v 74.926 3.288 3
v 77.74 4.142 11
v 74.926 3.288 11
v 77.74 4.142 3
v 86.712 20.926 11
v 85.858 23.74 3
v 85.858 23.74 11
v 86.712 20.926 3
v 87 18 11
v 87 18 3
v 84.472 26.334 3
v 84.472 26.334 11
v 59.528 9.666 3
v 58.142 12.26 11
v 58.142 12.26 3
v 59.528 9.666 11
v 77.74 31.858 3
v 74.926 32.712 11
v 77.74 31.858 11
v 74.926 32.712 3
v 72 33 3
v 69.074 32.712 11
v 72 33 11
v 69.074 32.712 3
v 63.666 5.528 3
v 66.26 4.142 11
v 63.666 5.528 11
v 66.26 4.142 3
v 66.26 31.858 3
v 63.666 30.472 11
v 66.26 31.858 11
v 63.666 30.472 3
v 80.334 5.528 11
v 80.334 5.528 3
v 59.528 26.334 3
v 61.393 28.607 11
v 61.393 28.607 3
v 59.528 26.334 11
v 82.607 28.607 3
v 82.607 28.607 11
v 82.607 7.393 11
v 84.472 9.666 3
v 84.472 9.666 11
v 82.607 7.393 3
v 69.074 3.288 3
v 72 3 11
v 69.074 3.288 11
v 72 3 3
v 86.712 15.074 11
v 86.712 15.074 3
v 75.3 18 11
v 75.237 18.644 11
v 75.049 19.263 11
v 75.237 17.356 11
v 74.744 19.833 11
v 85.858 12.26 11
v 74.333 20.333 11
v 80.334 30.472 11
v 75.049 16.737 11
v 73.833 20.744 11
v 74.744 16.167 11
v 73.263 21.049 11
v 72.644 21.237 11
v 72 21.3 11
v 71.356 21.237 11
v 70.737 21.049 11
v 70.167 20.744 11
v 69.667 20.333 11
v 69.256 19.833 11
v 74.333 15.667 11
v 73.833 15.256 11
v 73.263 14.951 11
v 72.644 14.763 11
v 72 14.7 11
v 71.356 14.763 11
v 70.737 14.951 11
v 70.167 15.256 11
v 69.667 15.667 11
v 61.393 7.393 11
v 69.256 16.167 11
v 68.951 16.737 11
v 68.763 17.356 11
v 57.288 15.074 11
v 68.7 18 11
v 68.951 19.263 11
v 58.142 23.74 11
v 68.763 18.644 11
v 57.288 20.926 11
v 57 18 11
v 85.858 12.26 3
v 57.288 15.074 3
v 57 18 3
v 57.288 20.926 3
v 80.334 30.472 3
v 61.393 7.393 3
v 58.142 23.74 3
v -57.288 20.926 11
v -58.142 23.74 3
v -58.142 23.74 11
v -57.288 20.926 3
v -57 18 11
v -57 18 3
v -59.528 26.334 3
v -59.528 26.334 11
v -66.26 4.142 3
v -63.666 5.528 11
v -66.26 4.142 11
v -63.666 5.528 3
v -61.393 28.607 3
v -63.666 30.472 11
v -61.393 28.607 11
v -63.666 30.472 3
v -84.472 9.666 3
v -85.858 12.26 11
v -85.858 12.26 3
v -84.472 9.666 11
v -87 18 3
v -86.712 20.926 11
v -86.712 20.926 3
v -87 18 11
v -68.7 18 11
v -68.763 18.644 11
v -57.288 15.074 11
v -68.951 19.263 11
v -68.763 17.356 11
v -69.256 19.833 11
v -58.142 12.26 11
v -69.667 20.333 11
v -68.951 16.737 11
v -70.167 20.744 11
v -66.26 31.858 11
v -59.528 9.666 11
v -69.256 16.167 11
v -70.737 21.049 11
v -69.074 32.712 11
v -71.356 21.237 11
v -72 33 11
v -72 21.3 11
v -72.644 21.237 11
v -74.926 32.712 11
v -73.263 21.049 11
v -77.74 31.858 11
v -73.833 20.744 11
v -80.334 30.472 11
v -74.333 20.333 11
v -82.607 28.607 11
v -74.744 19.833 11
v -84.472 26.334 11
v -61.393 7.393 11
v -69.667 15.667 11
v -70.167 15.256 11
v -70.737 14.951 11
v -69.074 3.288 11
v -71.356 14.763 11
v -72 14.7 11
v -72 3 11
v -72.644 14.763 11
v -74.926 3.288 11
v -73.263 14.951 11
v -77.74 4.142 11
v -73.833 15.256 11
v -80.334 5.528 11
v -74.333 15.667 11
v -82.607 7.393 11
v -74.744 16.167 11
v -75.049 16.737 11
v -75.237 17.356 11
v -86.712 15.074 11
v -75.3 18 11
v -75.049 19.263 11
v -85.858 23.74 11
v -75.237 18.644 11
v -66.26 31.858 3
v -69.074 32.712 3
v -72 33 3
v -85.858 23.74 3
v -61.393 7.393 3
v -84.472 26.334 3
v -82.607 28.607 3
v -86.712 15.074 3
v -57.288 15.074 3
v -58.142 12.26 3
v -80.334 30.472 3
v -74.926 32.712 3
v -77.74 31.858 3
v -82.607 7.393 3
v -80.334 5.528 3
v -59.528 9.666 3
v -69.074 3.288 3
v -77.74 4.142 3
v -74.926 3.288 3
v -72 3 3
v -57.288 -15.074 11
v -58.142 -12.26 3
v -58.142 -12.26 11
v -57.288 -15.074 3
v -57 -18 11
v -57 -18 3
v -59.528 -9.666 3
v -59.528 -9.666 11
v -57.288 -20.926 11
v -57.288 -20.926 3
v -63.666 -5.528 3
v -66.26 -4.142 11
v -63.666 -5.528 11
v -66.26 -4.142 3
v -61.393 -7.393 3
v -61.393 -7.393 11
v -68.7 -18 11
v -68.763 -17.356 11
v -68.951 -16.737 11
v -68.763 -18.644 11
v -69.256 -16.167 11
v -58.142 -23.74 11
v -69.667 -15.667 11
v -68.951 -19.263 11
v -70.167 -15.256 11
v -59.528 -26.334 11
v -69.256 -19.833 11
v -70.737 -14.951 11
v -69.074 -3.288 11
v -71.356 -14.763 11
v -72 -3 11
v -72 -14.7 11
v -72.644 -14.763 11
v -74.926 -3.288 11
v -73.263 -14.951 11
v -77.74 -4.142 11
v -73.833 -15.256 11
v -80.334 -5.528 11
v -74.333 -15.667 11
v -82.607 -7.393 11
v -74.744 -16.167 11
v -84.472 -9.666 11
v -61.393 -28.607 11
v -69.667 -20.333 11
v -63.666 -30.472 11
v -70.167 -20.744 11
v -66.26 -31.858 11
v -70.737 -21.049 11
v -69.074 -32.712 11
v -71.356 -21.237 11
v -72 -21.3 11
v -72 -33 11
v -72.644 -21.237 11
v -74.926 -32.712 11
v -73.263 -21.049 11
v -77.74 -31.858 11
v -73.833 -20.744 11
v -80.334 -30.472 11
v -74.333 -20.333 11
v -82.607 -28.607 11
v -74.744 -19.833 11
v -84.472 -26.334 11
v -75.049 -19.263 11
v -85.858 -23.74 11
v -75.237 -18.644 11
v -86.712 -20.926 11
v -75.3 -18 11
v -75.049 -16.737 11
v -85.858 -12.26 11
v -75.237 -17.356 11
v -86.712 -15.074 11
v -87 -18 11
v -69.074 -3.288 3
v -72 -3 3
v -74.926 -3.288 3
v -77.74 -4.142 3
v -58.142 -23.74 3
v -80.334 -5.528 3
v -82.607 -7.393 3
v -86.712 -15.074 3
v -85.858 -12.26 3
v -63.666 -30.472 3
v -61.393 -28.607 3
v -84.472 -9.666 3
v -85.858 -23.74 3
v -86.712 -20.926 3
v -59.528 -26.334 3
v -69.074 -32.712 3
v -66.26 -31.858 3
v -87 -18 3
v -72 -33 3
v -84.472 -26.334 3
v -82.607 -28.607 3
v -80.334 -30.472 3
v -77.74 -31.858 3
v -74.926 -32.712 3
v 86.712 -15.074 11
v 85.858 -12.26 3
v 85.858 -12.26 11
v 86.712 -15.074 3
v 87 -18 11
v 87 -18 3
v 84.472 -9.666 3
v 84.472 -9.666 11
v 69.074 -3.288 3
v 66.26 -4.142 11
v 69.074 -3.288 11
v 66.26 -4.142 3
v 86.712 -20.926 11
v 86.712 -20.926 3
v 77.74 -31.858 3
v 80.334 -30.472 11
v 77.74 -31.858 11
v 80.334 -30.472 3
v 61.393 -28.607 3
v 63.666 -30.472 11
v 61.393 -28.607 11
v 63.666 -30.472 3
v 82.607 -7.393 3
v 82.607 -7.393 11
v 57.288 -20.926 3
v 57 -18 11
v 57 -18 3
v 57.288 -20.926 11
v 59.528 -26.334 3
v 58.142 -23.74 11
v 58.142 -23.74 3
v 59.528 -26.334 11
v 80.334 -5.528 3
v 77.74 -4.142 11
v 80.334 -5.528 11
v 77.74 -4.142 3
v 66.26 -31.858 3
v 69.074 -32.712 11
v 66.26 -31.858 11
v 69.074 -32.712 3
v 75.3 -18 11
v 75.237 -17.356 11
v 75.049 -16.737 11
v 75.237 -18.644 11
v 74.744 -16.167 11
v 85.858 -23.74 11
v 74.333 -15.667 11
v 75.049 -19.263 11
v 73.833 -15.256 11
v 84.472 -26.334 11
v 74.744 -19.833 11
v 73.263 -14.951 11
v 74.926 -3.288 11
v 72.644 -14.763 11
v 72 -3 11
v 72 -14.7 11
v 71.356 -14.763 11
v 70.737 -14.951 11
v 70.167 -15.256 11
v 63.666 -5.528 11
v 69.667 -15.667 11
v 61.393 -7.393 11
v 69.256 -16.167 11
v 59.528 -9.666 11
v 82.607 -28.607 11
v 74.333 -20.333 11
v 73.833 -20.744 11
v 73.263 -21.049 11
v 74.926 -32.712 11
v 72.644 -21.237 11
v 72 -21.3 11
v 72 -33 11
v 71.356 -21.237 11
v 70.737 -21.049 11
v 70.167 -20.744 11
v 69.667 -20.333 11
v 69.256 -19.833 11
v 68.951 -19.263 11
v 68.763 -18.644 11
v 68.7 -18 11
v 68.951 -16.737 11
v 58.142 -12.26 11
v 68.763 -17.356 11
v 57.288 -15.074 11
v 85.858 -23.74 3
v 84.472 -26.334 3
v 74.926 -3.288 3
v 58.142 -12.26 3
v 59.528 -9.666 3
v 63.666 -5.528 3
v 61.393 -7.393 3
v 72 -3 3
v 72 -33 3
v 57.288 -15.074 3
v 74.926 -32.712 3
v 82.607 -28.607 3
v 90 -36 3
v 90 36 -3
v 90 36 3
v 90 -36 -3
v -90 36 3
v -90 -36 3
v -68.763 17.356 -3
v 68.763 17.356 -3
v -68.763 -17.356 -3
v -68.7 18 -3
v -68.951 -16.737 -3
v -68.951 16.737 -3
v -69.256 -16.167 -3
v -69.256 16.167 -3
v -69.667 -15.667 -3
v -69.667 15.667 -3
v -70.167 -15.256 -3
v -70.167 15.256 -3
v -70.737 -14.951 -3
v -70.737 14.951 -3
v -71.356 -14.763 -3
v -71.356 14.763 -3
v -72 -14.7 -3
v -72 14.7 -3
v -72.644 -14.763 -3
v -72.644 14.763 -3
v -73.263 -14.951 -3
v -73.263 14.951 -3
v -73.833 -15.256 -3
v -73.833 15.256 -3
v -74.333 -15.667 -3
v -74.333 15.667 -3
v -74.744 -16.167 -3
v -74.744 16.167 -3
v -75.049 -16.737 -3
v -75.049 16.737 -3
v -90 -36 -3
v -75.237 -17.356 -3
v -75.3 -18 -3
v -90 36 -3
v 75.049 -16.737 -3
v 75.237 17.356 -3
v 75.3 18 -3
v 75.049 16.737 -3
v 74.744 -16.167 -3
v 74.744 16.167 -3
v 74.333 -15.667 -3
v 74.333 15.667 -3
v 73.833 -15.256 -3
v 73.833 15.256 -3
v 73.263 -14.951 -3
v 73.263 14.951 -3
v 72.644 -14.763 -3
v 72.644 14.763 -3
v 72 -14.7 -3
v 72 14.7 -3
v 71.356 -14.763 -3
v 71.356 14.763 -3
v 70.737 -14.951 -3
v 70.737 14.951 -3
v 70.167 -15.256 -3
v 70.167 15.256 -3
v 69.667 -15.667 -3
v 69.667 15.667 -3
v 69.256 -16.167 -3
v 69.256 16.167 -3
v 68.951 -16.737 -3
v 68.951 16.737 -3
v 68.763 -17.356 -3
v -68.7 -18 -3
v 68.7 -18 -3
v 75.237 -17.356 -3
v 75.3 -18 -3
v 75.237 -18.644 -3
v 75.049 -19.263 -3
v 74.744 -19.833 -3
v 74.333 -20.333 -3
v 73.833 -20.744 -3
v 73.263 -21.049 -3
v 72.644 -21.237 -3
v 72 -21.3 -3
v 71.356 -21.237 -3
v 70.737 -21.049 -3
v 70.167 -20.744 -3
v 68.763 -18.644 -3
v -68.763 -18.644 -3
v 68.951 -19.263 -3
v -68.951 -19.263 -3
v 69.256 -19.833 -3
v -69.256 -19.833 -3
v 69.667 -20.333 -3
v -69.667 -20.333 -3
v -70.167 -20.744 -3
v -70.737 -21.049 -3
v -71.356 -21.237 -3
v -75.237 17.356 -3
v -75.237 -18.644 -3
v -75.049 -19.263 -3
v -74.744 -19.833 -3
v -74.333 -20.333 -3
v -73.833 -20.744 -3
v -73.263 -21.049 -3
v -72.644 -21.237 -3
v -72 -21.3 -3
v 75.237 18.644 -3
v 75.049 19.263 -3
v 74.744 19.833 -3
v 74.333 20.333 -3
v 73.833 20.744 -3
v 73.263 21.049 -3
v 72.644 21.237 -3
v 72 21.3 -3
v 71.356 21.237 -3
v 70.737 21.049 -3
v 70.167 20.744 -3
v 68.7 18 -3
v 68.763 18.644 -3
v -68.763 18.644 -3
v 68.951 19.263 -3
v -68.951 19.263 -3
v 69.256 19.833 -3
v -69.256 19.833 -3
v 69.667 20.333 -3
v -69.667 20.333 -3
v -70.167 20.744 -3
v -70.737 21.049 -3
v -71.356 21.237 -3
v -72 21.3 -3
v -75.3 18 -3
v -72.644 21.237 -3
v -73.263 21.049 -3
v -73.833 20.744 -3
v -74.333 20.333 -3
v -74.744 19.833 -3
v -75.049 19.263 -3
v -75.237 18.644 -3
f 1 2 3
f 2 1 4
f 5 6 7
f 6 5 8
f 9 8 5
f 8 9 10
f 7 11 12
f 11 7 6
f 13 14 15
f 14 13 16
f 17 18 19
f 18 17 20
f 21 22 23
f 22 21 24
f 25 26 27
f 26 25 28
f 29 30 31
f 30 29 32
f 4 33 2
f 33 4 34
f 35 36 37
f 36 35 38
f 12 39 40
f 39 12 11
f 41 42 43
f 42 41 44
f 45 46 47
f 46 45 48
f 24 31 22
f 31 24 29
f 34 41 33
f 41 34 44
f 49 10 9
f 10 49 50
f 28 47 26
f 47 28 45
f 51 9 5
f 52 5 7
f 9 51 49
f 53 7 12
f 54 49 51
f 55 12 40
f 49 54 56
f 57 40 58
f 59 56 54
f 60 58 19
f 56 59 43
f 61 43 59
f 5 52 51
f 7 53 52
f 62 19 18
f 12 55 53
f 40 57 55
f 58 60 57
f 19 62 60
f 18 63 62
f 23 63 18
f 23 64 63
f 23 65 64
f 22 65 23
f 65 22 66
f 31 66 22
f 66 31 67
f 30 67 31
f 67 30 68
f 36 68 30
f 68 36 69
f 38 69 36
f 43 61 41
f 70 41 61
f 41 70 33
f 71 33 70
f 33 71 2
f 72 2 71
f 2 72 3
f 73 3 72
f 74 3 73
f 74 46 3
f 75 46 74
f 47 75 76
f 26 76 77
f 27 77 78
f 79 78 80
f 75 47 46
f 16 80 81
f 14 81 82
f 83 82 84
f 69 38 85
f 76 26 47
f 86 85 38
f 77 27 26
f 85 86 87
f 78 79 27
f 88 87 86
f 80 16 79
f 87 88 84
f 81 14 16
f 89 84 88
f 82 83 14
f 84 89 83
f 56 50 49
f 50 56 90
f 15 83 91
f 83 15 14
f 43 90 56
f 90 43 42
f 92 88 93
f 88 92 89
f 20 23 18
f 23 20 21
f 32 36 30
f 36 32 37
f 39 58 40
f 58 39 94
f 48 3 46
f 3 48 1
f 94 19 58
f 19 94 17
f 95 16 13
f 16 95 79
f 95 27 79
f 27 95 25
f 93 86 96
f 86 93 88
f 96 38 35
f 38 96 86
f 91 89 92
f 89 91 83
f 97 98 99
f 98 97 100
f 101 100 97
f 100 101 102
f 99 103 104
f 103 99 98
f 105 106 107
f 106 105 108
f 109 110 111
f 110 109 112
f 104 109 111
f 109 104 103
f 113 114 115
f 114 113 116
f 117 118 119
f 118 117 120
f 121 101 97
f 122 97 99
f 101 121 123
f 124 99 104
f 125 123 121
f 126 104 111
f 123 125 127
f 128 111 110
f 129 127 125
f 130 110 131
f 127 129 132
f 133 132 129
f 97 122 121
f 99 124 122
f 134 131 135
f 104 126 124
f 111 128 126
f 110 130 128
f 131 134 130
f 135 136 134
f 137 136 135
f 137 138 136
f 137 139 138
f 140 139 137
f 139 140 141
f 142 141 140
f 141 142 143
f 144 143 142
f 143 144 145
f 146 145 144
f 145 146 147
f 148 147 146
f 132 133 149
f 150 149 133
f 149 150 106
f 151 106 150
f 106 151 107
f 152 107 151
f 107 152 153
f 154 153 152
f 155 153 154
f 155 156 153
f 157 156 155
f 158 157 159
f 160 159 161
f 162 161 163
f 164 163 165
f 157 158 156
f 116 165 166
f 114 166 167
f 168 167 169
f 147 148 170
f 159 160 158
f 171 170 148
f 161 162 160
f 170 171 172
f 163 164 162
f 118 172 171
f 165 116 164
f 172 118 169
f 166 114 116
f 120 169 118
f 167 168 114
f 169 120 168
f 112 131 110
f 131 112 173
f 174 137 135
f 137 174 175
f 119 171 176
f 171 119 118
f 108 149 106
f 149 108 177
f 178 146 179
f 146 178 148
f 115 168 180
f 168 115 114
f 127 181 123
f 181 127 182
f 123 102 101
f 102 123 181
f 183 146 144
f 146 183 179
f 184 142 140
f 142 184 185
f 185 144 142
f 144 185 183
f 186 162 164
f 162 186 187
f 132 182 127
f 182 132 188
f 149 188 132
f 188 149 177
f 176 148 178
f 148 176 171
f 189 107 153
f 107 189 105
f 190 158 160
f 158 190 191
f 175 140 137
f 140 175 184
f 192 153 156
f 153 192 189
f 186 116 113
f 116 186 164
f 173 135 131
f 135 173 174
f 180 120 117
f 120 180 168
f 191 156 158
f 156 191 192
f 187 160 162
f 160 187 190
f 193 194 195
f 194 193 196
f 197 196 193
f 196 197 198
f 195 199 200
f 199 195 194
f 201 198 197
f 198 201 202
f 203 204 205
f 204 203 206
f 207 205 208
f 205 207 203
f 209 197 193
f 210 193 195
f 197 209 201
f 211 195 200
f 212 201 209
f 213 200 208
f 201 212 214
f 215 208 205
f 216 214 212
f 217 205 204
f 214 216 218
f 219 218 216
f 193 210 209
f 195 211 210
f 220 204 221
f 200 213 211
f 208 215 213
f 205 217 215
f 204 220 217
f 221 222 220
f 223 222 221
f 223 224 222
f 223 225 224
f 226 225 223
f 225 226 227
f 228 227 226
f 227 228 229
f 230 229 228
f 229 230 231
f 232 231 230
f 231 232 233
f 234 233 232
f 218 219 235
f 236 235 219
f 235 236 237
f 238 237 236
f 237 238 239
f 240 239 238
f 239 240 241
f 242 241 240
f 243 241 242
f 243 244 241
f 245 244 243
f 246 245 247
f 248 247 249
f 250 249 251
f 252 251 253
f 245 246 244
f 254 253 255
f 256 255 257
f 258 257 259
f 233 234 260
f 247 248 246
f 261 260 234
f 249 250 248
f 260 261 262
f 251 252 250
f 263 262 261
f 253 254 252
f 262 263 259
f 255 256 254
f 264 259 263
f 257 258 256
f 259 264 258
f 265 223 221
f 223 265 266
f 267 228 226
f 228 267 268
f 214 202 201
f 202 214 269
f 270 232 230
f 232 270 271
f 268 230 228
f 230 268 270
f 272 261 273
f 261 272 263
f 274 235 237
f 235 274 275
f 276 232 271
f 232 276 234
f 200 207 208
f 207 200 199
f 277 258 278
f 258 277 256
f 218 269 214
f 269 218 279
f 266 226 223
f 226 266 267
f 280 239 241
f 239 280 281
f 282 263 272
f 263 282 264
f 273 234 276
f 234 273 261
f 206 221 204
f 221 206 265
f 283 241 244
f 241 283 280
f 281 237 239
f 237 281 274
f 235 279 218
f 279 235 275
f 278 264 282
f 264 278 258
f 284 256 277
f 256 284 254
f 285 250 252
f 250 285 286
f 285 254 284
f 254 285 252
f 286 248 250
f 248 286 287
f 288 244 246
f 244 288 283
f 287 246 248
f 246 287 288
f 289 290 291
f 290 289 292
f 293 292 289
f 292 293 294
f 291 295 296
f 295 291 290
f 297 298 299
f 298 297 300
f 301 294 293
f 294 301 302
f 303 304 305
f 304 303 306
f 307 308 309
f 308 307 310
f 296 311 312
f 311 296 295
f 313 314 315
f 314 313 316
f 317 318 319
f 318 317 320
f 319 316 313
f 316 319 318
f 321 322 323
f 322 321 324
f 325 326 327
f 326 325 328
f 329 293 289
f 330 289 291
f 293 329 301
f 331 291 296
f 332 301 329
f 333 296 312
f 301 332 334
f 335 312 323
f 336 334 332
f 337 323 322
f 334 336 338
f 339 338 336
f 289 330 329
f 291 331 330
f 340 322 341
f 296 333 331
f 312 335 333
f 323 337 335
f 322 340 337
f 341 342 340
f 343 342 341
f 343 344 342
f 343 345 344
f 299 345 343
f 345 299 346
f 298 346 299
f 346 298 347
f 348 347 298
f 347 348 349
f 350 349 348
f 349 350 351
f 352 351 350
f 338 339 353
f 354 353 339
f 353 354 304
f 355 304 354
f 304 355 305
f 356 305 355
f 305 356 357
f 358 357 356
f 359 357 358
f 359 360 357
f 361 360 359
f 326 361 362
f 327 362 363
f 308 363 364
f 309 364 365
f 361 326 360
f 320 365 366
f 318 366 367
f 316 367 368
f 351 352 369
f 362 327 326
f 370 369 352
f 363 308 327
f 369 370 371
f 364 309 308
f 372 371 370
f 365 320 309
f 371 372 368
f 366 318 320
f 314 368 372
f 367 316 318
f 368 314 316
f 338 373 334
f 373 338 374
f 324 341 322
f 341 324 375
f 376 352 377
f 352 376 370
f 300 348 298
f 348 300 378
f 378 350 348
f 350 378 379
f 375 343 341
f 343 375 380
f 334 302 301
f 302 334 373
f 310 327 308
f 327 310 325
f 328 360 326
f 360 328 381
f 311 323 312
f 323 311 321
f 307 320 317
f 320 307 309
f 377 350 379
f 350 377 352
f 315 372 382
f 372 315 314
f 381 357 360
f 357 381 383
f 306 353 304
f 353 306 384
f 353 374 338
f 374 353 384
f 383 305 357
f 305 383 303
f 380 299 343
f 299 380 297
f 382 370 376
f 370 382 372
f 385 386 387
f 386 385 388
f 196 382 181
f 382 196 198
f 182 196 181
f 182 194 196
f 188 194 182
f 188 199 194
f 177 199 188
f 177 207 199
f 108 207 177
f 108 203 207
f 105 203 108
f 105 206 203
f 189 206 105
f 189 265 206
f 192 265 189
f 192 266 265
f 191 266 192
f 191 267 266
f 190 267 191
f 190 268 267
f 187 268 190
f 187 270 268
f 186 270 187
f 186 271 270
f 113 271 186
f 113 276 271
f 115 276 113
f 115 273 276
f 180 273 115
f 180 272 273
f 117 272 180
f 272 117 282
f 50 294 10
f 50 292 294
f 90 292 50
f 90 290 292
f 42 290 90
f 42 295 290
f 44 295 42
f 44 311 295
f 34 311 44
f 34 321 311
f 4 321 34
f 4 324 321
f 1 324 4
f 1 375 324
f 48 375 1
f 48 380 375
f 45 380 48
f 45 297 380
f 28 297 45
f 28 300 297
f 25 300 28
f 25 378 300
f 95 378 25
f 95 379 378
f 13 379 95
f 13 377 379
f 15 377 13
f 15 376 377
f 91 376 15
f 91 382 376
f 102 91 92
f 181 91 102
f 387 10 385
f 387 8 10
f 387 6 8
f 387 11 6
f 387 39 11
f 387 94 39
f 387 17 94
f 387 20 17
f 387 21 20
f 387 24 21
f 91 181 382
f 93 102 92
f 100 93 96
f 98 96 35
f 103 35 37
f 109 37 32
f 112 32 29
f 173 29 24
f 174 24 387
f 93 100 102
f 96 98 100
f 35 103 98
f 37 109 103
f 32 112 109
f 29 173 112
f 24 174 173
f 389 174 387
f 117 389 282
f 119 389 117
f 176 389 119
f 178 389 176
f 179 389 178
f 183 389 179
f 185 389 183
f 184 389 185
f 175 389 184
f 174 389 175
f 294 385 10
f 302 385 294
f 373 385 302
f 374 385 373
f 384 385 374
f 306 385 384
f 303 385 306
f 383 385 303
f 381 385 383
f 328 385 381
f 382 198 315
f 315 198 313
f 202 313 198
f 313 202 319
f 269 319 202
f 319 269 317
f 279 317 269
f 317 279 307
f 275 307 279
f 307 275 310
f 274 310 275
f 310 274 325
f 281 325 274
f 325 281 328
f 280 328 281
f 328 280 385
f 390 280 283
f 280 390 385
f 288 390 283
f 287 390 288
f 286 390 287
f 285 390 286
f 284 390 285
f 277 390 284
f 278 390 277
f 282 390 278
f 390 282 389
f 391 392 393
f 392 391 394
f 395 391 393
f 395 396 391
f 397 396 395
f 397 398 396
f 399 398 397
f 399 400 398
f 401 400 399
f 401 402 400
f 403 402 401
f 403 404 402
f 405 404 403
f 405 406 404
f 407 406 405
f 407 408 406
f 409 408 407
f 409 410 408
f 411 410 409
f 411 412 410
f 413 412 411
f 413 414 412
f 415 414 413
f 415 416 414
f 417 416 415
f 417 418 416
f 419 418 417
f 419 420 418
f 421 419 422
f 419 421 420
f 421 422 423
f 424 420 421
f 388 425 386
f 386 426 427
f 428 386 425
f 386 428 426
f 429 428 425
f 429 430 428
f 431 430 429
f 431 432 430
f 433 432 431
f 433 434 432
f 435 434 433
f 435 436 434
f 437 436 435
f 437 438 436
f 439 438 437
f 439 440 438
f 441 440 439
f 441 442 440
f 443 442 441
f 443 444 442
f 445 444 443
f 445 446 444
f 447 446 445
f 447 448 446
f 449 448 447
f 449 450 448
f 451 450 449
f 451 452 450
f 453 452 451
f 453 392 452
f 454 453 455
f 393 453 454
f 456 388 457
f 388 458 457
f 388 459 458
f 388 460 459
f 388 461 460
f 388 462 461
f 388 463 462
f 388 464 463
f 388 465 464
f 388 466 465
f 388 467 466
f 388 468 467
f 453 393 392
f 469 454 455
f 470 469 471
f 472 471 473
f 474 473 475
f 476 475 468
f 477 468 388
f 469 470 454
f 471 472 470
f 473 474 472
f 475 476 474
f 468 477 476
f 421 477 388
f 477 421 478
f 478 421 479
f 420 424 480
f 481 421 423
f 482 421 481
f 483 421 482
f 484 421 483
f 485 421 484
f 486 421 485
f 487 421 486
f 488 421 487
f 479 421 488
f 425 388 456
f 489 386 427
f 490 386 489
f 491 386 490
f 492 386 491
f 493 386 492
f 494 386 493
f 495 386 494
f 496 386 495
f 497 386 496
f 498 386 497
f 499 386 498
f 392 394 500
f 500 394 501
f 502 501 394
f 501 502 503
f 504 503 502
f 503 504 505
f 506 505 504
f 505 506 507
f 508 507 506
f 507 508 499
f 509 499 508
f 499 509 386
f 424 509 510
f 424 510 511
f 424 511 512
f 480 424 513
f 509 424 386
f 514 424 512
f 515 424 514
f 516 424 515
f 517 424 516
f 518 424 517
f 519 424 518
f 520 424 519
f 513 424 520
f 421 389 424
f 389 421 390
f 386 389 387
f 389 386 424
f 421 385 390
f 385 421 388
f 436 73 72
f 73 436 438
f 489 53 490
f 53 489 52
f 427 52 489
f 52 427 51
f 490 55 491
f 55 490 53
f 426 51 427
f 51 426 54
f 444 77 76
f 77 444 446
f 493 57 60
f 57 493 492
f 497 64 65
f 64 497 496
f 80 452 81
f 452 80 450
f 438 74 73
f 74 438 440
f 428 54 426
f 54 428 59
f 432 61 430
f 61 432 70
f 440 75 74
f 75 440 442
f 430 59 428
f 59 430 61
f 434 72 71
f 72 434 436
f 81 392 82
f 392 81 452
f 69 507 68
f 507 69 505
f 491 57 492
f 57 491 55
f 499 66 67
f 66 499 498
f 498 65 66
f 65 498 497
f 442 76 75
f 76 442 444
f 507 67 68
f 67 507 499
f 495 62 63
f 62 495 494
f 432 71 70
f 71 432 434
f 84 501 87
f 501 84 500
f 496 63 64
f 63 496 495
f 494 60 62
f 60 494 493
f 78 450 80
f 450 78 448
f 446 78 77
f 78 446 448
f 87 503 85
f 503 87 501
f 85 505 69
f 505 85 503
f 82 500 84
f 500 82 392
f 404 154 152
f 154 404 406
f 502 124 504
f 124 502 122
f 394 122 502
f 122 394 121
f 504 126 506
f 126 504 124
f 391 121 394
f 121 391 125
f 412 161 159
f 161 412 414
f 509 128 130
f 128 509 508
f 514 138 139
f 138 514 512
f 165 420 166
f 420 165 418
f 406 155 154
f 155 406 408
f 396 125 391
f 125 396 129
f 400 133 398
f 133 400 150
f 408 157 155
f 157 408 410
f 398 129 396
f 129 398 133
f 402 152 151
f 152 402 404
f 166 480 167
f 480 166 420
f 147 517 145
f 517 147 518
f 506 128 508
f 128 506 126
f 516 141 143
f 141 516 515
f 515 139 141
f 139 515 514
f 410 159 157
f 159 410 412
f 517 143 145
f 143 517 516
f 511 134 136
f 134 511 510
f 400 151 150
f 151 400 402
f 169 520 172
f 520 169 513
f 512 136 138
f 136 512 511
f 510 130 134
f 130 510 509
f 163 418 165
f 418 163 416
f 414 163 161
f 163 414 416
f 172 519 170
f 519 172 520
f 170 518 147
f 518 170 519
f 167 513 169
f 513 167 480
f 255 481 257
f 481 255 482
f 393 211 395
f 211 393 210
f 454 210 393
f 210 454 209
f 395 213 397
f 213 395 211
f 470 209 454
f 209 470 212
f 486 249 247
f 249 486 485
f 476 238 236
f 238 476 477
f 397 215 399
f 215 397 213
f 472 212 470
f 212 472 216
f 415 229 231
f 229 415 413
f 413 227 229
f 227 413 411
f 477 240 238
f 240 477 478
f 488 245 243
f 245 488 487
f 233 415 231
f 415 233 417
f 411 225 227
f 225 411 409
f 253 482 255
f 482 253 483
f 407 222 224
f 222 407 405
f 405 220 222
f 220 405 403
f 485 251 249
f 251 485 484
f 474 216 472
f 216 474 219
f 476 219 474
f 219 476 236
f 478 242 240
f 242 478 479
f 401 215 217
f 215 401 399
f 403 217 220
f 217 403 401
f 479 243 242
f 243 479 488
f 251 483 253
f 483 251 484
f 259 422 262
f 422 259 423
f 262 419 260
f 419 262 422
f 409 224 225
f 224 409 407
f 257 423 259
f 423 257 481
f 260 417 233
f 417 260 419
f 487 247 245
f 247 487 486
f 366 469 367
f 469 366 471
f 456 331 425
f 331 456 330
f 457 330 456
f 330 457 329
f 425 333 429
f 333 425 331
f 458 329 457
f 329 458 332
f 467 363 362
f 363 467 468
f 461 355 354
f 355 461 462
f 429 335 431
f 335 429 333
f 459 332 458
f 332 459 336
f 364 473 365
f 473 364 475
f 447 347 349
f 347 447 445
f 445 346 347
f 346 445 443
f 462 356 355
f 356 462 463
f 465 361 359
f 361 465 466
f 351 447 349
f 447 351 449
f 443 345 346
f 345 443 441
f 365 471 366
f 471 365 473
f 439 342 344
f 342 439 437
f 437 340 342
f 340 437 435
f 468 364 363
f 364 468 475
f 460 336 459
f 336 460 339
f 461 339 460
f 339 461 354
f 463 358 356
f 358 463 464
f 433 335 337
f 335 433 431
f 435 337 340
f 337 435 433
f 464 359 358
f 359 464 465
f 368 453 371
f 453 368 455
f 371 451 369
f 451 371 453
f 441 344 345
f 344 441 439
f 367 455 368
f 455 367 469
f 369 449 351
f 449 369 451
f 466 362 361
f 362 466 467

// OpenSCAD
$fn = 32;

// ----------------------------------------------------------------------
// Anchor pads 180 x 72 x 14
// four corner bosses with anchor holes
// ----------------------------------------------------------------------

// --- parameters (mm) ---
plate = [180, 72, 6];  // base plate size (x, y, z)
pads = 4;              // boss count, one per corner
edge = 18;             // boss centre offset from the plate edge
boss_d = 30;           // boss diameter
boss_h = 8;            // boss height above the base plate
hole_d = 6.6;          // hole diameter

// --- derived feature positions (mm) ---
height = plate[2] + boss_h;      // = 14   overall height of the part
corner_x = plate[0] / 2 - edge;  // = 72   boss centre X
corner_y = plate[1] / 2 - edge;  // = 18   boss centre Y
feature_centers = [
  [corner_x, corner_y],
  [-corner_x, corner_y],
  [-corner_x, -corner_y],
  [corner_x, -corner_y]
];   // boss centres, anchor holes are drilled there

// base plate, four bosses standing on it, anchor holes all the way through
difference() {
  union() {
    cube(plate, center = true);
    for (centre = feature_centers)
      translate([centre[0], centre[1], plate[2] / 2 - 1])
        cylinder(d = boss_d, h = boss_h + 1);
  }
  for (centre = feature_centers)
    translate([centre[0], centre[1], -height])
      cylinder(d = hole_d, h = 2 * height + 2);  // through boss and plate
}
